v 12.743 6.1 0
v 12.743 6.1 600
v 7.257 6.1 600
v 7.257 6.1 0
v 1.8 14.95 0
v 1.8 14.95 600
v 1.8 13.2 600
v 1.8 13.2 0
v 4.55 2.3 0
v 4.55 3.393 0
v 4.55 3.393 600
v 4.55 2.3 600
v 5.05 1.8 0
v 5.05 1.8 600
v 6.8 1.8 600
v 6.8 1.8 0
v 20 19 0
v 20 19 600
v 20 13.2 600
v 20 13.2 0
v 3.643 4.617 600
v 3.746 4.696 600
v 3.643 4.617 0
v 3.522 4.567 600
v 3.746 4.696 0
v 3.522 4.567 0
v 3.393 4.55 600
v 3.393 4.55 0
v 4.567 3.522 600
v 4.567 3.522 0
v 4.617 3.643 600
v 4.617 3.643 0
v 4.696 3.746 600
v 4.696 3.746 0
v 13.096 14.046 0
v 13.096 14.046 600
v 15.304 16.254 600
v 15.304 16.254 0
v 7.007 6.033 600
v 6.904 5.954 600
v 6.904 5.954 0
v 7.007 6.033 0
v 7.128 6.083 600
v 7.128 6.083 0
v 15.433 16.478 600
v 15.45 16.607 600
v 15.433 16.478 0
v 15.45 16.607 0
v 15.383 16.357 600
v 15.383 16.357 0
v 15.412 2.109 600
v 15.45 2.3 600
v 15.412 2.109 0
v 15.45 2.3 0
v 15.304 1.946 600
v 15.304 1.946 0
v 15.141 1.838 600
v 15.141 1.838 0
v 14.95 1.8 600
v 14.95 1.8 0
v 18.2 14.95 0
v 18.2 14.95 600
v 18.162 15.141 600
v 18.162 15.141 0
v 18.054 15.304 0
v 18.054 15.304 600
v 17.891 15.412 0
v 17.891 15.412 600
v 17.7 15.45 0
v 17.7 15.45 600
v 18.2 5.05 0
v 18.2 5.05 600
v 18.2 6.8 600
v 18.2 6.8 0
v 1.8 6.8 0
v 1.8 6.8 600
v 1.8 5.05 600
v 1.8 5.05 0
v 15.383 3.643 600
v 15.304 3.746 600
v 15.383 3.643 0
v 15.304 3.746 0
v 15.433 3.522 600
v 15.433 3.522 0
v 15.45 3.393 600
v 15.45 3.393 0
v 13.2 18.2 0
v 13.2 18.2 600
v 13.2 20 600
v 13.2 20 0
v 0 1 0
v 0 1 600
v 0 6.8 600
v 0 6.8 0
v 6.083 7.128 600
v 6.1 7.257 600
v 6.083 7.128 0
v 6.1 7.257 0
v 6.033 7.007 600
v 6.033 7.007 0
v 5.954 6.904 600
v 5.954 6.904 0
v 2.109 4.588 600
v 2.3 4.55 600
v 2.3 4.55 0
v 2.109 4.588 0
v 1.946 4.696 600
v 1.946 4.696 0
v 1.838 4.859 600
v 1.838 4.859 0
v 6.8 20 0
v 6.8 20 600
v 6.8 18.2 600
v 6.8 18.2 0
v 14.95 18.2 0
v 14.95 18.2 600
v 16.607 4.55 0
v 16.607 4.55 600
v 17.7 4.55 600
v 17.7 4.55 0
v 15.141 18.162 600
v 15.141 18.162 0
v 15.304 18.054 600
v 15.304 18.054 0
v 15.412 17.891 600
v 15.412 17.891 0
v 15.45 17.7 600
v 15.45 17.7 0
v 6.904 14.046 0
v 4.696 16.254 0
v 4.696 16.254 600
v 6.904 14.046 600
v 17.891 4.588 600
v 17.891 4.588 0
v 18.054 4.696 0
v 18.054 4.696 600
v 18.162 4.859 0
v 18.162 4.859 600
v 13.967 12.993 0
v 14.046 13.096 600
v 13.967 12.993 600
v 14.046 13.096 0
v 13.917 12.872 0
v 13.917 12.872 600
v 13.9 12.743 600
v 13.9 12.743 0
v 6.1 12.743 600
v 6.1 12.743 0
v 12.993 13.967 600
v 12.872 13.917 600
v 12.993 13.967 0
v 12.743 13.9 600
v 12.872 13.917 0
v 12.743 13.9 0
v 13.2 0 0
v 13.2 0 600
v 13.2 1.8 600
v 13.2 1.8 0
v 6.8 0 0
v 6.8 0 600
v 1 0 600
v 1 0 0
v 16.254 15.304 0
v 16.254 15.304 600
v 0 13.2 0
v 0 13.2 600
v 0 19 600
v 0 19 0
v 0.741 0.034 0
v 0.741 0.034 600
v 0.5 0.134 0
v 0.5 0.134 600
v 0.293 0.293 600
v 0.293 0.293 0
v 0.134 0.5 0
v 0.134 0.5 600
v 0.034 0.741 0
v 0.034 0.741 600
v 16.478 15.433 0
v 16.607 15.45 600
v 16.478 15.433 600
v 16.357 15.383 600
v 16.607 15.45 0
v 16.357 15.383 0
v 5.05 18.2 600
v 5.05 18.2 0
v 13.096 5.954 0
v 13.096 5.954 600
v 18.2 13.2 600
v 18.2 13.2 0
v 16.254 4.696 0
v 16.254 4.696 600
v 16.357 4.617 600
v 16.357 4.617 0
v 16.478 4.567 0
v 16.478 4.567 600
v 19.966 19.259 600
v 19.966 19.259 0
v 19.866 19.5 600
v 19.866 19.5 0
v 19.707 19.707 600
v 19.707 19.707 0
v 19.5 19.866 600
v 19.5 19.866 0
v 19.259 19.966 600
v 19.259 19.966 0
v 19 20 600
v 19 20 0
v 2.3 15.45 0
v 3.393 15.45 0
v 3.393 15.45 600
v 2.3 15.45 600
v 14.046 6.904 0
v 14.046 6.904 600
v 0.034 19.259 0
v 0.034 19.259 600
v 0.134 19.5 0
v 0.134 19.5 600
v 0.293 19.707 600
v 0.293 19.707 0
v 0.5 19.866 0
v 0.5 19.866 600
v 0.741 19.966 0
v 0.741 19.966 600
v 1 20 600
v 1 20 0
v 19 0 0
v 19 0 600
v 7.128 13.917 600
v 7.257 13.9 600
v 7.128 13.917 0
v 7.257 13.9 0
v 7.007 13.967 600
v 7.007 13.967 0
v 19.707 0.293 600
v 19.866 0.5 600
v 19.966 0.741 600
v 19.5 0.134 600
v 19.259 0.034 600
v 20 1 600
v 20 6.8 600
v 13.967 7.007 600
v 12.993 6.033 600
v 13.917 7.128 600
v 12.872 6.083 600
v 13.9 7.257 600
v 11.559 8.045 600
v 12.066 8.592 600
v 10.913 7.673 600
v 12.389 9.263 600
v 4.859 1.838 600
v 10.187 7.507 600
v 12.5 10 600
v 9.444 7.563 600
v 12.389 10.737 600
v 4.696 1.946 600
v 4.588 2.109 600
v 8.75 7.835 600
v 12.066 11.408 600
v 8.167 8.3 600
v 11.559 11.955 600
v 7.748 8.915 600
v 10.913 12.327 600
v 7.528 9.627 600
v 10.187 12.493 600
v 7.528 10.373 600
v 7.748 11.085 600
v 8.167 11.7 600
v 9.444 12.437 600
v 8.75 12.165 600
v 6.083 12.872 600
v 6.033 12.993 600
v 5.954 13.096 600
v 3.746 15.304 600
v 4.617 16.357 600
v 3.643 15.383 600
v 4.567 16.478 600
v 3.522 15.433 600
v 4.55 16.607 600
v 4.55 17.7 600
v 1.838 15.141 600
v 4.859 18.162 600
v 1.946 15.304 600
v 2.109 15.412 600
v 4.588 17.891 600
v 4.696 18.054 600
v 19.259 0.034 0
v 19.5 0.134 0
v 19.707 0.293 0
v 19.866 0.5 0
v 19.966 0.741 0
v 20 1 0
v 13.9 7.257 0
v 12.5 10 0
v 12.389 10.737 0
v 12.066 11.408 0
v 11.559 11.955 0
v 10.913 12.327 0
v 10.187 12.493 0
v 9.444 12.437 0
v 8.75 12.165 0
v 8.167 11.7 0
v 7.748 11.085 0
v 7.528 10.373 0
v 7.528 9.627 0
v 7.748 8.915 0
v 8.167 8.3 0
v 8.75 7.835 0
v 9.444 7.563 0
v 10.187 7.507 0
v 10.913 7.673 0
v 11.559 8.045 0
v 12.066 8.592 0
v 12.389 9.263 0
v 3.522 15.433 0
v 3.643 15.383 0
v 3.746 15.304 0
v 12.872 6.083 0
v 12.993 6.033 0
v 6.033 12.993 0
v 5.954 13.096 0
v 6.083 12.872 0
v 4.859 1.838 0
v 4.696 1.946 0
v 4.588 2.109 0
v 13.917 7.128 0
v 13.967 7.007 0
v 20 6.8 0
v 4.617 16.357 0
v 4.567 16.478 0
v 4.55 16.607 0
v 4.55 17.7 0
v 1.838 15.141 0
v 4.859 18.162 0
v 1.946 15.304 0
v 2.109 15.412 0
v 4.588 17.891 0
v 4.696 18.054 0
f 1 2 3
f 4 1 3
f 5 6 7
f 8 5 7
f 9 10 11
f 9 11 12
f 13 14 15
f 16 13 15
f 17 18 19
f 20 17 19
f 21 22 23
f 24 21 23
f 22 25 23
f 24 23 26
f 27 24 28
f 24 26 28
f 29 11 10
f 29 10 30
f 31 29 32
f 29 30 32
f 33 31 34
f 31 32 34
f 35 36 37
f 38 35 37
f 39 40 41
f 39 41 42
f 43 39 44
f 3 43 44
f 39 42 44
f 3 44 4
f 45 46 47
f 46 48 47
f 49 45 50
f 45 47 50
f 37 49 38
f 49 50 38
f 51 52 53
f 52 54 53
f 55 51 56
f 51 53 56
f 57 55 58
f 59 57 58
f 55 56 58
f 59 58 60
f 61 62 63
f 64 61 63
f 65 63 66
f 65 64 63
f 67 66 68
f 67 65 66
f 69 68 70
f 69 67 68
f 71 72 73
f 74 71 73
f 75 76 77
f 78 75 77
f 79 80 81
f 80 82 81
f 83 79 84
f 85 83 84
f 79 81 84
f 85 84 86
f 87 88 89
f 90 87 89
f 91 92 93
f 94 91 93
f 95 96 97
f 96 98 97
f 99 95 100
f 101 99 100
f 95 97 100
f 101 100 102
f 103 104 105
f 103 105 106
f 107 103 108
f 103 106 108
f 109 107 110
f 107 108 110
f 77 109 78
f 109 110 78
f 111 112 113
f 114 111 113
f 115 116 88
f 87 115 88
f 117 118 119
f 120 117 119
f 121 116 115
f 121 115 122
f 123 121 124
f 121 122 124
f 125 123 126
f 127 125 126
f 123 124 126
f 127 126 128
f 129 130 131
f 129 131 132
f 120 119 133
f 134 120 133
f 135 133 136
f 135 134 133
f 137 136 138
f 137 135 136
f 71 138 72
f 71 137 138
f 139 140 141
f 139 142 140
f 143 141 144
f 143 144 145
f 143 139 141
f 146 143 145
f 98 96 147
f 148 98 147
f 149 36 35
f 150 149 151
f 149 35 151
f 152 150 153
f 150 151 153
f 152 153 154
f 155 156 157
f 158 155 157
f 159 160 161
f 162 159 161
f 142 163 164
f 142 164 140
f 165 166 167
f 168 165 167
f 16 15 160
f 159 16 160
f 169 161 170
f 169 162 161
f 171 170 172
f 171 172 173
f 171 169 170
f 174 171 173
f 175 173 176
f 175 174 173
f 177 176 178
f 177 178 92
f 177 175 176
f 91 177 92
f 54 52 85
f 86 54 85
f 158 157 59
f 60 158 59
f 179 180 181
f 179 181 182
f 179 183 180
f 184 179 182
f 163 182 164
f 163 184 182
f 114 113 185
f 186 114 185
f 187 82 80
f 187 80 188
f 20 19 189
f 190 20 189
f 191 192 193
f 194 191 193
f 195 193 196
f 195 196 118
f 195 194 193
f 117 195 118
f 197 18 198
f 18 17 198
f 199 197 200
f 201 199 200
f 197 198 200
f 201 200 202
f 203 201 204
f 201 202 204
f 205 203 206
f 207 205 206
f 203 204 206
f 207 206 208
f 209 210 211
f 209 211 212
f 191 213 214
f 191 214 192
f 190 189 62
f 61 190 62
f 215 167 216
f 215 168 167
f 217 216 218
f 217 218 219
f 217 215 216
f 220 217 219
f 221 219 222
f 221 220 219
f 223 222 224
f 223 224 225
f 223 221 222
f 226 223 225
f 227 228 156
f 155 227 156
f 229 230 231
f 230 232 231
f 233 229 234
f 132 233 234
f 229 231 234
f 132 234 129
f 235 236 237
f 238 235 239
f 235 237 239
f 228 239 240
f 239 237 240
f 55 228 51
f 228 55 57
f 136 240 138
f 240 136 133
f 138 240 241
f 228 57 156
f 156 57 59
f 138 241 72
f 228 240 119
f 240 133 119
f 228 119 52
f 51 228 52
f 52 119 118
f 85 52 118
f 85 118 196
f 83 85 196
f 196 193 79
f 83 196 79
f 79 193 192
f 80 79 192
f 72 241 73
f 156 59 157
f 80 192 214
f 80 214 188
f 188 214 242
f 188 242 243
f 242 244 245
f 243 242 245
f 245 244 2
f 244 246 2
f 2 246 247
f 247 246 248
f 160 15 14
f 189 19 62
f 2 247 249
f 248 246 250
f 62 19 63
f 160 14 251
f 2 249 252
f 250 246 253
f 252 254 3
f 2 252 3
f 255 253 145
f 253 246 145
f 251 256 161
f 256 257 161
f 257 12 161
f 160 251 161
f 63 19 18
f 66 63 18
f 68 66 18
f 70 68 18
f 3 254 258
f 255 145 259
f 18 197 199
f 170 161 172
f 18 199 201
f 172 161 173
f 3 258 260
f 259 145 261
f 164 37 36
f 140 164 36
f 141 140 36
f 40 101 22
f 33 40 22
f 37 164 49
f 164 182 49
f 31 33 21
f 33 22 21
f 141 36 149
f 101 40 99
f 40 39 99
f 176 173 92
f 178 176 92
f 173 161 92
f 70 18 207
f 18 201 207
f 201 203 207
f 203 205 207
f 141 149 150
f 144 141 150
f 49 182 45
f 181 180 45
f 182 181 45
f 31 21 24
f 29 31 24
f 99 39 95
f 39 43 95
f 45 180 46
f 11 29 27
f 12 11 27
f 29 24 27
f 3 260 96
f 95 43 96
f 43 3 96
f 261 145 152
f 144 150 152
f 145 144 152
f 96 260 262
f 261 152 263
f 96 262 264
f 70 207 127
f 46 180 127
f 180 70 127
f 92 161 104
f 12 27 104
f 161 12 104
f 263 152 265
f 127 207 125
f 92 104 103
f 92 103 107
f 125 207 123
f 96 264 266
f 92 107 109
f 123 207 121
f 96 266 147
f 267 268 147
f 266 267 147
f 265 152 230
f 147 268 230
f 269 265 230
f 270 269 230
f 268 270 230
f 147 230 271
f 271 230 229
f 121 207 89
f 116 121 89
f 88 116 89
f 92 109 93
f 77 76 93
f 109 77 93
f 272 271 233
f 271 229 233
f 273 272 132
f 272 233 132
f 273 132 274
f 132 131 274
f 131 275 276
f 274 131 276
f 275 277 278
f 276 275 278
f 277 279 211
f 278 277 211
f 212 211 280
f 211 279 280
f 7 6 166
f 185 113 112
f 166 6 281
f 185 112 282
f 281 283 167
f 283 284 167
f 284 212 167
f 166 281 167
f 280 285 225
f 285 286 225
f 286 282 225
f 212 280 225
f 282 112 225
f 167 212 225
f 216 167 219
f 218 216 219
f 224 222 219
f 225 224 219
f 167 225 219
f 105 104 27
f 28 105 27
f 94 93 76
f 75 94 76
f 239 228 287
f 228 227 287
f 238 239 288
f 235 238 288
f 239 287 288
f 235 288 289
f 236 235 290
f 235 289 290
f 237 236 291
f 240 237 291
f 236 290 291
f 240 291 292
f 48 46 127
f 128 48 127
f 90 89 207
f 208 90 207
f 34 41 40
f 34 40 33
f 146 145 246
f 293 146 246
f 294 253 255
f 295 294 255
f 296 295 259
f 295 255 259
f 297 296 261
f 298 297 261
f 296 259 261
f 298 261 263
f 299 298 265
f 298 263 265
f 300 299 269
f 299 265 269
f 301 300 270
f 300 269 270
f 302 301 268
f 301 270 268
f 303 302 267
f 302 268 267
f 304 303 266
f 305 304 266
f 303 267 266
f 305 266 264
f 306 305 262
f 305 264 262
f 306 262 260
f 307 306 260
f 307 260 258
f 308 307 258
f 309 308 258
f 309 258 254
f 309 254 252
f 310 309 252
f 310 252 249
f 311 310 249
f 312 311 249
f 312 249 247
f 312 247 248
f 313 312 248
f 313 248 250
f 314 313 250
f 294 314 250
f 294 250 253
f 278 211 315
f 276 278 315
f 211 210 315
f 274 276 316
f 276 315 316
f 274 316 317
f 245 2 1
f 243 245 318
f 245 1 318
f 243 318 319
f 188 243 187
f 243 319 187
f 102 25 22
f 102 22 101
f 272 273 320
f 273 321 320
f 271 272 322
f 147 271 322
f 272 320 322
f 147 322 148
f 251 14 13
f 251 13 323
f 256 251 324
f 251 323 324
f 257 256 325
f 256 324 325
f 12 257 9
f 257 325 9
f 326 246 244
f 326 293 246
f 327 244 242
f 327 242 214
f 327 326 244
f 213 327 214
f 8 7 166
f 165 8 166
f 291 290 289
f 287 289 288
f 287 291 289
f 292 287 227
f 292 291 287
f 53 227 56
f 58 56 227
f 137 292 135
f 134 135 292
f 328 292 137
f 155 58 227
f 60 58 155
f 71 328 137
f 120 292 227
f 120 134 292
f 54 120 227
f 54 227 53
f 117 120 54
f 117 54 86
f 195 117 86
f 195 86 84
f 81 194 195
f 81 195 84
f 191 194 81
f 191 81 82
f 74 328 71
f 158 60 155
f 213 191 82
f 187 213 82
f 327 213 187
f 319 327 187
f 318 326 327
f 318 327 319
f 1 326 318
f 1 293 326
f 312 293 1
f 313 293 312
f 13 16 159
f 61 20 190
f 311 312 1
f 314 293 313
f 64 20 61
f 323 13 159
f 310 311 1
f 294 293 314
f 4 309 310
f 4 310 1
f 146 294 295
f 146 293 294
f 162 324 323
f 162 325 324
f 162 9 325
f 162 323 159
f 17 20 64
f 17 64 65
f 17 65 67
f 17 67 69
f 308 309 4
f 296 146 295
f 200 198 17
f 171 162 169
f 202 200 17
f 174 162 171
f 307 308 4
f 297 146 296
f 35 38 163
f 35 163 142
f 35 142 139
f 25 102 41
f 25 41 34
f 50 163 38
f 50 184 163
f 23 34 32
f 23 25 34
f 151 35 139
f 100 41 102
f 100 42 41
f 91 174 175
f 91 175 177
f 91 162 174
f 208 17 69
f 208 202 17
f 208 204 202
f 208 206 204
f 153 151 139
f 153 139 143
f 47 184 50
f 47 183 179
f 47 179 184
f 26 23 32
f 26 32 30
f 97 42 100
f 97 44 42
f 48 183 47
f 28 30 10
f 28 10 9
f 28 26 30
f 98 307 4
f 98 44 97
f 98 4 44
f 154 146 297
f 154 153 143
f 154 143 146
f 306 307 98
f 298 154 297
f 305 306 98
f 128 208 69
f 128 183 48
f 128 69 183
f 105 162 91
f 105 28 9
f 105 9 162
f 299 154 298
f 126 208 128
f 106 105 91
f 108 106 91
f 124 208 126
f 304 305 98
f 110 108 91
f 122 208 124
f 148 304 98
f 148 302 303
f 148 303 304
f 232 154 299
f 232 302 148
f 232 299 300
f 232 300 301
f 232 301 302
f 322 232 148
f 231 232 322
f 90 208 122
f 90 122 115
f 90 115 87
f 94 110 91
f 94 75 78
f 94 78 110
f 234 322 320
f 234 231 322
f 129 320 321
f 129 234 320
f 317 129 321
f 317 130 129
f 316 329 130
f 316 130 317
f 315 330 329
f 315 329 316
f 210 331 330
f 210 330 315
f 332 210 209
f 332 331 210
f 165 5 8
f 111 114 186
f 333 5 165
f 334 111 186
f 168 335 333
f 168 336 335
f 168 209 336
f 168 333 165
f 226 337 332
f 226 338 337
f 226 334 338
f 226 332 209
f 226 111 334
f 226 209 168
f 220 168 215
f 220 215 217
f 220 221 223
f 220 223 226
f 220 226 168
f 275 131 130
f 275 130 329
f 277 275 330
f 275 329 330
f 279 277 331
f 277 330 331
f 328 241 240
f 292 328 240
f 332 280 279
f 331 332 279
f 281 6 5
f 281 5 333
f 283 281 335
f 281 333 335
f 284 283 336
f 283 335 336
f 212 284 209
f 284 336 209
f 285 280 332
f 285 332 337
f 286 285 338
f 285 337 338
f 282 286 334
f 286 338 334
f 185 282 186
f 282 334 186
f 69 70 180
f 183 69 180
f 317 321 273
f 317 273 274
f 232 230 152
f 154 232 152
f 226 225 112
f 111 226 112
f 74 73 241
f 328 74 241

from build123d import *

# Parameters (mm, degrees)
SKETCH1_R           = 2.5
BOSS_EXTRUDE1_DEPTH = 300
FILLET1_R           = 1
FILLET2_R           = 0.5
FILLET3_R           = 0.5
FILLET4_R           = 0.5
FILLET5_R           = 0.5


with BuildPart() as part:
    # Sketch1 → Boss-Extrude1 (new body)
    with BuildSketch(Plane.XY):
        Polygon((13.2, 0), (13.2, 1.8), (15.45, 1.8), (15.45, 3.6), (12.95, 6.1), (7.05, 6.1), (4.55, 3.6), (4.55, 1.8), (6.8, 1.8), (6.8, 0), (0, 0), (0, 6.8), (1.8, 6.8), (1.8, 4.55), (3.6, 4.55), (6.1, 7.05), (6.1, 12.95), (3.6, 15.45), (1.8, 15.45), (1.8, 13.2), (0, 13.2), (0, 20), (6.8, 20), (6.8, 18.2), (4.55, 18.2), (4.55, 16.4), (7.05, 13.9), (12.95, 13.9), (15.45, 16.4), (15.45, 18.2), (13.2, 18.2), (13.2, 20), (20, 20), (20, 13.2), (18.2, 13.2), (18.2, 15.45), (16.4, 15.45), (13.9, 12.95), (13.9, 7.05), (16.4, 4.55), (18.2, 4.55), (18.2, 6.8), (20, 6.8), (20, 0), align=None)
        with Locations((10, 10)):
            Circle(SKETCH1_R, mode=Mode.SUBTRACT)
    extrude(amount=BOSS_EXTRUDE1_DEPTH)

    # Fillet1
    fillet1_edges = [part.edges().sort_by_distance(p)[0] for p in [
        (0, 0, 150),
        (0, 20, 150),
        (20, 20, 150),
        (20, 0, 150),
    ]]
    fillet(fillet1_edges, radius=FILLET1_R)

    # Fillet2
    fillet2_edges = [part.edges().sort_by_distance(p)[0] for p in [
        (4.55, 18.2, 150),
        (4.55, 16.4, 150),
        (7.05, 13.9, 150),
        (12.95, 13.9, 150),
        (15.45, 16.4, 150),
        (15.45, 18.2, 150),
    ]]
    fillet(fillet2_edges, radius=FILLET2_R)

    # Fillet3
    fillet3_edges = [part.edges().sort_by_distance(p)[0] for p in [
        (18.2, 15.45, 150),
        (16.4, 15.45, 150),
        (13.9, 12.95, 150),
        (13.9, 7.05, 150),
        (16.4, 4.55, 150),
        (18.2, 4.55, 150),
    ]]
    fillet(fillet3_edges, radius=FILLET3_R)

    # Fillet4
    fillet4_edges = [part.edges().sort_by_distance(p)[0] for p in [
        (1.8, 4.55, 150),
        (3.6, 4.55, 150),
        (6.1, 7.05, 150),
        (6.1, 12.95, 150),
        (3.6, 15.45, 150),
        (1.8, 15.45, 150),
    ]]
    fillet(fillet4_edges, radius=FILLET4_R)

    # Fillet5
    fillet5_edges = [part.edges().sort_by_distance(p)[0] for p in [
        (15.45, 1.8, 150),
        (15.45, 3.6, 150),
        (12.95, 6.1, 150),
        (7.05, 6.1, 150),
        (4.55, 3.6, 150),
        (4.55, 1.8, 150),
    ]]
    fillet(fillet5_edges, radius=FILLET5_R)

    # Mirror1: part across plane


with BuildPart() as part_1:
    add(part.part)
    add(part.part.mirror(Plane.XY.offset(300)))


solid = part_1.part
